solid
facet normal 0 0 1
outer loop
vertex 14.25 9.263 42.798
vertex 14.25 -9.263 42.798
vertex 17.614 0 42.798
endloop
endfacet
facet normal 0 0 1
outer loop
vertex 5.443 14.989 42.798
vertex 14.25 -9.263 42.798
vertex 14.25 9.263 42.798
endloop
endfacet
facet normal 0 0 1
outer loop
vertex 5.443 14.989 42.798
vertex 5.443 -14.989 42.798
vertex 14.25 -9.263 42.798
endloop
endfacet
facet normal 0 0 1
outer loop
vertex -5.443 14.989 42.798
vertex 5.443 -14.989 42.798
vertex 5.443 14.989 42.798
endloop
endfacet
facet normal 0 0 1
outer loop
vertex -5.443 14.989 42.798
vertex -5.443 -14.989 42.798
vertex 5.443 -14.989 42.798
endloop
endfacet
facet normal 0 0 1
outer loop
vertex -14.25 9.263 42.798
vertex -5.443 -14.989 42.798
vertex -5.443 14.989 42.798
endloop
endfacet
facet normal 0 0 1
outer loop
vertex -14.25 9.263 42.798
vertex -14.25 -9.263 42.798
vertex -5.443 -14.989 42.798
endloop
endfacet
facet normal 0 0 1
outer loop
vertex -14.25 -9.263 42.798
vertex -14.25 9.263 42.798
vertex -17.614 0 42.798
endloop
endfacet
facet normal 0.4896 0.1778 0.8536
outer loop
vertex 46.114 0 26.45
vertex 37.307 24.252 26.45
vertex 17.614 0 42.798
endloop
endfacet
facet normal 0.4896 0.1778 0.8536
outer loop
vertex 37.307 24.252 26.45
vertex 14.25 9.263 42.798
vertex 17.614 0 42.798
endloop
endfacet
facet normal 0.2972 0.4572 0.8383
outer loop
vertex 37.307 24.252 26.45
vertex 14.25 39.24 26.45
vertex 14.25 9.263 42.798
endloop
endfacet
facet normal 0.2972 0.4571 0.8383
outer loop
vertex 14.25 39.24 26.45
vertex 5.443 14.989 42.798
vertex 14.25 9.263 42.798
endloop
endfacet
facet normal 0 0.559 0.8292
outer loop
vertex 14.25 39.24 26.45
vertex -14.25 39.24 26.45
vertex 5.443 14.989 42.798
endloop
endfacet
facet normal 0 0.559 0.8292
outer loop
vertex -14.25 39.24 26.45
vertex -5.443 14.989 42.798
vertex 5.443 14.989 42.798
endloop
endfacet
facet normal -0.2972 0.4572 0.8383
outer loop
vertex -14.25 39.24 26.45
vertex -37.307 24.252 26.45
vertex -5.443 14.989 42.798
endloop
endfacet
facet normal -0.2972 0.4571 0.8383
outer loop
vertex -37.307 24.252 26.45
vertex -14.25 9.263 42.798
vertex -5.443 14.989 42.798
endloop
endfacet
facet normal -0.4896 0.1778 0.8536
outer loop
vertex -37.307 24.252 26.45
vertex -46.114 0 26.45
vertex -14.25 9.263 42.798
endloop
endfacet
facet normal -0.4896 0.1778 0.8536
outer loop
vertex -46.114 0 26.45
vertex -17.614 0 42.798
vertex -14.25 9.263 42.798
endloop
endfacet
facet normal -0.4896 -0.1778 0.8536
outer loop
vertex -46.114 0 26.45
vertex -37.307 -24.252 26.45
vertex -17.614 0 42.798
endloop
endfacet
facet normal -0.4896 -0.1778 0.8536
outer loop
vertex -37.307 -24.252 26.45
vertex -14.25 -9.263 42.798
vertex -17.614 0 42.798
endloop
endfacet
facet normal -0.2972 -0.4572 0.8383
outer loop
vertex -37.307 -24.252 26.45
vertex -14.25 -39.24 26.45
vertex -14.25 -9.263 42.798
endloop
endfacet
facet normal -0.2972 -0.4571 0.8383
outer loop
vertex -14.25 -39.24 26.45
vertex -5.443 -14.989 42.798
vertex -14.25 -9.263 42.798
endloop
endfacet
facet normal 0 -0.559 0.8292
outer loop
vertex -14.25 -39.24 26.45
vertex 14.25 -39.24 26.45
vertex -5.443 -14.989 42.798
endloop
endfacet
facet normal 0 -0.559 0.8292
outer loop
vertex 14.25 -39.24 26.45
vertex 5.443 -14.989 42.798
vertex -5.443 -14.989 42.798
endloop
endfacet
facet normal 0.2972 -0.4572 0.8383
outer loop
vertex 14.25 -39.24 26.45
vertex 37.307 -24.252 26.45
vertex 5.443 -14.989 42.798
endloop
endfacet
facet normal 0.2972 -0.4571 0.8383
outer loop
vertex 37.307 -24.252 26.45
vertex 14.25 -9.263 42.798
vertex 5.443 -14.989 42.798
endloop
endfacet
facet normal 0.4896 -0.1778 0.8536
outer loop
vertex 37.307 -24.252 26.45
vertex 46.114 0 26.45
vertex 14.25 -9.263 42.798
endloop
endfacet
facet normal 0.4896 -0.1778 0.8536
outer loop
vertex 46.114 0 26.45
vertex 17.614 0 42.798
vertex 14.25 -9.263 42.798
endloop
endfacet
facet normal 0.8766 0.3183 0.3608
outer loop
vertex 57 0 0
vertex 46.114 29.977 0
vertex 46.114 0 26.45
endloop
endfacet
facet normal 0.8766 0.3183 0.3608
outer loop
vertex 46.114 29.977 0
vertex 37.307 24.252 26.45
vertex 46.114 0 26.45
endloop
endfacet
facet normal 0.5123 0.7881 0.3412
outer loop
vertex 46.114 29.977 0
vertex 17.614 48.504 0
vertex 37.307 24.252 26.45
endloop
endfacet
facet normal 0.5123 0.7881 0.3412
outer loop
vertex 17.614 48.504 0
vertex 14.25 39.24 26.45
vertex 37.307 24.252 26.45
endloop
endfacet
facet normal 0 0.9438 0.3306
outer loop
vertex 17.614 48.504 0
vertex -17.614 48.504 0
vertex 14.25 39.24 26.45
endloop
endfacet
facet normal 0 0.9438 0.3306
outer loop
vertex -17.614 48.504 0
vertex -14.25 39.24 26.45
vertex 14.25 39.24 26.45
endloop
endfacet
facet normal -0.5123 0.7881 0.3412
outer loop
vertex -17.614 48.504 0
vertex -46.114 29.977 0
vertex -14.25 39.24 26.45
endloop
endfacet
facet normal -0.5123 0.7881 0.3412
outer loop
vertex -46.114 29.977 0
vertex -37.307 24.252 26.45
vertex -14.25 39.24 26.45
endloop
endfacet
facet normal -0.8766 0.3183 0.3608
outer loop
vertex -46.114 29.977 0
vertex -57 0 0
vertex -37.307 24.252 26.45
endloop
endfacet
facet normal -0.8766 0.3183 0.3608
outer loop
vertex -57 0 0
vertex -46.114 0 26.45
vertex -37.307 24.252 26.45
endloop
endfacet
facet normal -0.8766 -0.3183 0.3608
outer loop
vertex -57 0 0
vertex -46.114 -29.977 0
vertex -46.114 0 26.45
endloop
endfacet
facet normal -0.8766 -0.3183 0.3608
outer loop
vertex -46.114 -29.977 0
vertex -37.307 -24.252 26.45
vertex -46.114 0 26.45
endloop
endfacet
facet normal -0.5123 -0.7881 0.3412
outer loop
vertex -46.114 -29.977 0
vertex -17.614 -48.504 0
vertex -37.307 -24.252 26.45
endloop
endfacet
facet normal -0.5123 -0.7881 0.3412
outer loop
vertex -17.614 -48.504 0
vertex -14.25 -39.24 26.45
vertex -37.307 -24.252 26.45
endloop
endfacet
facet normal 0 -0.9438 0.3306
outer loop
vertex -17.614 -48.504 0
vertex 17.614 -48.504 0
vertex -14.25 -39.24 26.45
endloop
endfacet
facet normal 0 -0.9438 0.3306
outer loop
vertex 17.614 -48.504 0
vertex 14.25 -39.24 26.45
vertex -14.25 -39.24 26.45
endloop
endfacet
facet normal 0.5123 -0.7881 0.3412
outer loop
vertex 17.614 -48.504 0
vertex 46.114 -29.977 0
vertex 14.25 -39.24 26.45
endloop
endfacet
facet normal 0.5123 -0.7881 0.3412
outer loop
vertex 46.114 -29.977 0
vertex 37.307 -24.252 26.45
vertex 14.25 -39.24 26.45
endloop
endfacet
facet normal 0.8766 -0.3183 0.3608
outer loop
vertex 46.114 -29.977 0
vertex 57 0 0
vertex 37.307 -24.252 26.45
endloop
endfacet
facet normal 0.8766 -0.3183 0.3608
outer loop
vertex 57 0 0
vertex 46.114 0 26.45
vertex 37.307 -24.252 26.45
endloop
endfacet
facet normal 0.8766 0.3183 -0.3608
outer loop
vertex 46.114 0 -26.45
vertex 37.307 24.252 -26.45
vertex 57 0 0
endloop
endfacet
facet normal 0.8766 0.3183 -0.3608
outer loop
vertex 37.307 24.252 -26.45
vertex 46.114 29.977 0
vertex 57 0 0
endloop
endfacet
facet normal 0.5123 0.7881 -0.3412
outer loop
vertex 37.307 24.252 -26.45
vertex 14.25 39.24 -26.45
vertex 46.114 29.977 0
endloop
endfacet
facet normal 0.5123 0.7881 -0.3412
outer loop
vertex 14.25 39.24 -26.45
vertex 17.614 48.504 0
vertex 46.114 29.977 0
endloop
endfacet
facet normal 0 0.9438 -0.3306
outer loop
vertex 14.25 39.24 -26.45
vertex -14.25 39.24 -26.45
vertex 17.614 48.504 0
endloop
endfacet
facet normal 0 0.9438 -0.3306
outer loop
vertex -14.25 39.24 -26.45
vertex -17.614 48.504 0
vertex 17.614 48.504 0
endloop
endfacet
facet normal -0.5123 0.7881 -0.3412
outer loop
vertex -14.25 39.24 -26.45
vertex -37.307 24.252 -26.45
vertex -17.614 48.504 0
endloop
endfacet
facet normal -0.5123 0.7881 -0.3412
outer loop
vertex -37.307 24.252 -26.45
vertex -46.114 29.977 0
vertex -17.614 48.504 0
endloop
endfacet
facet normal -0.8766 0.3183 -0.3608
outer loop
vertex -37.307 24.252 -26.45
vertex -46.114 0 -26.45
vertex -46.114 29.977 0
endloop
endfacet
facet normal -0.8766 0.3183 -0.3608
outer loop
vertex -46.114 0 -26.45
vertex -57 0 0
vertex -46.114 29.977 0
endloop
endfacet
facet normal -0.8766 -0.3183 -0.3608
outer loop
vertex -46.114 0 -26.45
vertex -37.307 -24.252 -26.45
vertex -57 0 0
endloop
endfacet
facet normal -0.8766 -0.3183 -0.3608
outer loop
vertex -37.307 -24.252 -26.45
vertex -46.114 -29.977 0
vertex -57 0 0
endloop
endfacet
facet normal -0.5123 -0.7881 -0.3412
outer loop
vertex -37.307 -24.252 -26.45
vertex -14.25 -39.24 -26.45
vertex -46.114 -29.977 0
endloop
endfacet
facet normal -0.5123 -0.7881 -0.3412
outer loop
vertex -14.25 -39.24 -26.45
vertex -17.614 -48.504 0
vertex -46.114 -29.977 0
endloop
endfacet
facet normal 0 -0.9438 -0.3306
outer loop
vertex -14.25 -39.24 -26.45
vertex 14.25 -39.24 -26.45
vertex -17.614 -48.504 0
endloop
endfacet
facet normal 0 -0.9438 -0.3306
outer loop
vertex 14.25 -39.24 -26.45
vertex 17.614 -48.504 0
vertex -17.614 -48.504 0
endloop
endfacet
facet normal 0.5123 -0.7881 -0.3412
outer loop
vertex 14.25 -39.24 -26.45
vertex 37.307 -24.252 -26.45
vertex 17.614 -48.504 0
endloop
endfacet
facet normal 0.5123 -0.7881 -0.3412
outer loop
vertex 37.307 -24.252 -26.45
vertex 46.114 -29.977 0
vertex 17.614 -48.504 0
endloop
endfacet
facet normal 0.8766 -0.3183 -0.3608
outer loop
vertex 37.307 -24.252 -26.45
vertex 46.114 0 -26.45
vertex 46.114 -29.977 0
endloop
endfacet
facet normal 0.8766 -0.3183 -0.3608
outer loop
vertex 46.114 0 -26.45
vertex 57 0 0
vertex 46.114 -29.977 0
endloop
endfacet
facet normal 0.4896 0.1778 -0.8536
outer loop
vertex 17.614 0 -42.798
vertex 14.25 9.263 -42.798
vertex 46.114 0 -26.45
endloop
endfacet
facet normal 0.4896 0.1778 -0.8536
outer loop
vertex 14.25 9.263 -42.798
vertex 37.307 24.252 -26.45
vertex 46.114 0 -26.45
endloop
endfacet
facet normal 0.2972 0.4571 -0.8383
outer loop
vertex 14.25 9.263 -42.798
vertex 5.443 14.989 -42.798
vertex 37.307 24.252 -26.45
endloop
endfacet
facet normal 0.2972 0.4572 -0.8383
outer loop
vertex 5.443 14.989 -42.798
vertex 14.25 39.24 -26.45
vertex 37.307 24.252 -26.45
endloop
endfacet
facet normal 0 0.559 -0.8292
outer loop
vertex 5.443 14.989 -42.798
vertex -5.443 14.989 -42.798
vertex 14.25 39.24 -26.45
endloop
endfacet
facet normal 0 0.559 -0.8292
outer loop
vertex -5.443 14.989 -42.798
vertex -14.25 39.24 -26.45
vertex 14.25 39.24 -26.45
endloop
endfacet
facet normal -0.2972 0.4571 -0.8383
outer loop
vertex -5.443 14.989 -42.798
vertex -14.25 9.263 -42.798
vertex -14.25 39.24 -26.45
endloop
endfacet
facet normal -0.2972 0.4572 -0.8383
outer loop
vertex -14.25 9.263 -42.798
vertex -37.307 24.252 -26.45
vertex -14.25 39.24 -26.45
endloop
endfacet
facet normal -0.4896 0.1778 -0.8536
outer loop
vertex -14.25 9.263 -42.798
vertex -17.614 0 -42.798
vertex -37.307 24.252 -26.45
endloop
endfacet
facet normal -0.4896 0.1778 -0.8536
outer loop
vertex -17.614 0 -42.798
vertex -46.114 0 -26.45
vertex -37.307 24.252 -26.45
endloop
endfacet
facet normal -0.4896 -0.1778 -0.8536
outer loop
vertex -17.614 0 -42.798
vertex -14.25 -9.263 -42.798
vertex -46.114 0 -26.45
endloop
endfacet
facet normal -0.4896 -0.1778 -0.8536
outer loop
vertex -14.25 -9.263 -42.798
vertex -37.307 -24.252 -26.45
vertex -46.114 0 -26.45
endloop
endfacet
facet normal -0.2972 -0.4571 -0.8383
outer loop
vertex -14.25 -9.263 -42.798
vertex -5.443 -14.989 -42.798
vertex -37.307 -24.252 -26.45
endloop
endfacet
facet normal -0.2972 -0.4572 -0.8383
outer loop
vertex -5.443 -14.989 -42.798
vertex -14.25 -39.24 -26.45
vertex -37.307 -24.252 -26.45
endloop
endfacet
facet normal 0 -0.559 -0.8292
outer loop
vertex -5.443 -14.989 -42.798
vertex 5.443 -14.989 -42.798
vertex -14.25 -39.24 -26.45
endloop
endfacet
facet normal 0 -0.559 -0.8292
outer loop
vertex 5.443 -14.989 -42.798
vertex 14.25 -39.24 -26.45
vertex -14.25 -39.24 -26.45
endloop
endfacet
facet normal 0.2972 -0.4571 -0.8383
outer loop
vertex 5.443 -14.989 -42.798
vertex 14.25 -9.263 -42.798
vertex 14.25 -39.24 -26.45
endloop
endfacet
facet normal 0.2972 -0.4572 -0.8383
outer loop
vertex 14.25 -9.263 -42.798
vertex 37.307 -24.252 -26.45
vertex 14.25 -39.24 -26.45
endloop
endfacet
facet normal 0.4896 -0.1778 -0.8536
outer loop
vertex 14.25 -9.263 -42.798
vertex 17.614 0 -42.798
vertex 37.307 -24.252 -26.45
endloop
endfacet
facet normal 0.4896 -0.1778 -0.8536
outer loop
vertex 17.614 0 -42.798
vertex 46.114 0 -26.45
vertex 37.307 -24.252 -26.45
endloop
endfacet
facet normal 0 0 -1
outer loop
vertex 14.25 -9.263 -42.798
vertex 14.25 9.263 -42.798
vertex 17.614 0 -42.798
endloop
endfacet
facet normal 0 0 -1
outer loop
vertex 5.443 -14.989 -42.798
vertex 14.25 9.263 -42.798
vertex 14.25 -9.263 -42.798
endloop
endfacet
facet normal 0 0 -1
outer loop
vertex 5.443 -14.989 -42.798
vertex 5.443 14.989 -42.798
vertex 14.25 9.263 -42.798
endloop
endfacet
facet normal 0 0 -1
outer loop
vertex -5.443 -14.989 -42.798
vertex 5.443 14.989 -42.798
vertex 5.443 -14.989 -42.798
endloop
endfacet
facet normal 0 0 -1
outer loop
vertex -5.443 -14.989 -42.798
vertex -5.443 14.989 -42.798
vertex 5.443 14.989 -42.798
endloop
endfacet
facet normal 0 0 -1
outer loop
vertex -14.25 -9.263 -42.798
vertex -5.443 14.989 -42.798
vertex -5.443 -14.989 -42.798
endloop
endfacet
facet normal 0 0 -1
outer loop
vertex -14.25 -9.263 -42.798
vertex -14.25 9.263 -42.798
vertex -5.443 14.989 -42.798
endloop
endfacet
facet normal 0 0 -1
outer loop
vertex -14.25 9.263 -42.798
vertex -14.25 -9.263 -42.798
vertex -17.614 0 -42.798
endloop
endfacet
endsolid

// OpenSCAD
// Generated by SolidPython 1.0.1 on 2020-07-29 00:46:54


scale(v = [19, 17, 15]) {
	sphere(r = 3);
}
/***********************************************
*********      SolidPython code:      **********
************************************************
 
# import packages: SolidPython
from solid import *
from solid.utils import *
from itertools import chain, combinations, permutations


class Resize:

    def __init__(self, scad_file):
        self.scad_file = scad_file
        #self.scad_file = import_scad(scad_file)
        # cone/cylinder param:
        self.r1 = 0
        self.r2 = 0
        self.h = 0
        # rectangular prism param:
        self.w = 0
        self.l = 0
        # ellipse param:
        self.r = 0

    # import OpenScad code (file name corresponds to shape)


    # classify shape + parameters
    def assign(self, param1, param2, param3):
        if self.scad_file == 'cone.scad':
            self.r1 = param1
            self.r2 = param2
            self.h = param3
        elif self.scad_file == 'cylinder.scad':
            self.r1 = param1
            self.r2 = param2
            self.h = param3
        elif self.scad_file == 'rectangularPrism.scad':
            self.h = param1
            self.l = param2
            self.w = param3
        else:
            self.r = param1
            self.h = param2

    # resize parameters
    def iterate(self):
        x = range(3, 20, 2)
        i = 1
        if self.scad_file == 'cone.scad':
            tempList = list(permutations(x, 2))
            for temp in tempList:
                param1 = temp[0]
                param2 = temp[1]
                filepath = 'produced_scad_files/' + 'cone' + str(param1) + '_' + str(param2) + '_' + '.scad'
                scad_render_to_file(cylinder(h=param1, r1=param2, r2=0), filepath)

        elif self.scad_file == 'cylinder.scad':
            tempList = list(permutations(x, 3))
            for temp in tempList:
                param1 = temp[0]
                param2 = temp[1]
                filepath = 'produced_scad_files/' + 'cylinder' + str(param1) + '_' + str(param2) + '_' + '.scad'
                scad_render_to_file(cylinder(h=param1, r1=param2, r2=param2), filepath)

        elif self.scad_file == 'rectangularPrism.scad':
            tempList = list(permutations(x, 3))
            for temp in tempList:
                param1 = temp[0]
                param2 = temp[1]
                param3 = temp[2]
                filepath = 'produced_scad_files/' + 'rectangularPrism' + str(param1) + '_' + str(param2) + '_' + str(
                    param3) + '.scad'
                scad_render_to_file(cube(size=(param1, param2, param3)), filepath)

        elif self.scad_file == 'ellipse.scad':
            tempList = list(permutations(x, 4))
            for temp in tempList:
                param1 = temp[0]
                param2 = temp[1]
                param3 = temp[2]
                param4 = temp[3]
                filepath = 'produced_scad_files/' + 'ellipse' + str(param1) + '_' + str(param2) + '_' + str(param3) + '_' + str(param4) + '.scad'
                scad_render_to_file(scale([param1, param2, param3])(sphere(r=param4)), filepath)

    def render_to_scadfile(self):
        scad_render_to_file(scad, 'example.scad') 
 
************************************************/
